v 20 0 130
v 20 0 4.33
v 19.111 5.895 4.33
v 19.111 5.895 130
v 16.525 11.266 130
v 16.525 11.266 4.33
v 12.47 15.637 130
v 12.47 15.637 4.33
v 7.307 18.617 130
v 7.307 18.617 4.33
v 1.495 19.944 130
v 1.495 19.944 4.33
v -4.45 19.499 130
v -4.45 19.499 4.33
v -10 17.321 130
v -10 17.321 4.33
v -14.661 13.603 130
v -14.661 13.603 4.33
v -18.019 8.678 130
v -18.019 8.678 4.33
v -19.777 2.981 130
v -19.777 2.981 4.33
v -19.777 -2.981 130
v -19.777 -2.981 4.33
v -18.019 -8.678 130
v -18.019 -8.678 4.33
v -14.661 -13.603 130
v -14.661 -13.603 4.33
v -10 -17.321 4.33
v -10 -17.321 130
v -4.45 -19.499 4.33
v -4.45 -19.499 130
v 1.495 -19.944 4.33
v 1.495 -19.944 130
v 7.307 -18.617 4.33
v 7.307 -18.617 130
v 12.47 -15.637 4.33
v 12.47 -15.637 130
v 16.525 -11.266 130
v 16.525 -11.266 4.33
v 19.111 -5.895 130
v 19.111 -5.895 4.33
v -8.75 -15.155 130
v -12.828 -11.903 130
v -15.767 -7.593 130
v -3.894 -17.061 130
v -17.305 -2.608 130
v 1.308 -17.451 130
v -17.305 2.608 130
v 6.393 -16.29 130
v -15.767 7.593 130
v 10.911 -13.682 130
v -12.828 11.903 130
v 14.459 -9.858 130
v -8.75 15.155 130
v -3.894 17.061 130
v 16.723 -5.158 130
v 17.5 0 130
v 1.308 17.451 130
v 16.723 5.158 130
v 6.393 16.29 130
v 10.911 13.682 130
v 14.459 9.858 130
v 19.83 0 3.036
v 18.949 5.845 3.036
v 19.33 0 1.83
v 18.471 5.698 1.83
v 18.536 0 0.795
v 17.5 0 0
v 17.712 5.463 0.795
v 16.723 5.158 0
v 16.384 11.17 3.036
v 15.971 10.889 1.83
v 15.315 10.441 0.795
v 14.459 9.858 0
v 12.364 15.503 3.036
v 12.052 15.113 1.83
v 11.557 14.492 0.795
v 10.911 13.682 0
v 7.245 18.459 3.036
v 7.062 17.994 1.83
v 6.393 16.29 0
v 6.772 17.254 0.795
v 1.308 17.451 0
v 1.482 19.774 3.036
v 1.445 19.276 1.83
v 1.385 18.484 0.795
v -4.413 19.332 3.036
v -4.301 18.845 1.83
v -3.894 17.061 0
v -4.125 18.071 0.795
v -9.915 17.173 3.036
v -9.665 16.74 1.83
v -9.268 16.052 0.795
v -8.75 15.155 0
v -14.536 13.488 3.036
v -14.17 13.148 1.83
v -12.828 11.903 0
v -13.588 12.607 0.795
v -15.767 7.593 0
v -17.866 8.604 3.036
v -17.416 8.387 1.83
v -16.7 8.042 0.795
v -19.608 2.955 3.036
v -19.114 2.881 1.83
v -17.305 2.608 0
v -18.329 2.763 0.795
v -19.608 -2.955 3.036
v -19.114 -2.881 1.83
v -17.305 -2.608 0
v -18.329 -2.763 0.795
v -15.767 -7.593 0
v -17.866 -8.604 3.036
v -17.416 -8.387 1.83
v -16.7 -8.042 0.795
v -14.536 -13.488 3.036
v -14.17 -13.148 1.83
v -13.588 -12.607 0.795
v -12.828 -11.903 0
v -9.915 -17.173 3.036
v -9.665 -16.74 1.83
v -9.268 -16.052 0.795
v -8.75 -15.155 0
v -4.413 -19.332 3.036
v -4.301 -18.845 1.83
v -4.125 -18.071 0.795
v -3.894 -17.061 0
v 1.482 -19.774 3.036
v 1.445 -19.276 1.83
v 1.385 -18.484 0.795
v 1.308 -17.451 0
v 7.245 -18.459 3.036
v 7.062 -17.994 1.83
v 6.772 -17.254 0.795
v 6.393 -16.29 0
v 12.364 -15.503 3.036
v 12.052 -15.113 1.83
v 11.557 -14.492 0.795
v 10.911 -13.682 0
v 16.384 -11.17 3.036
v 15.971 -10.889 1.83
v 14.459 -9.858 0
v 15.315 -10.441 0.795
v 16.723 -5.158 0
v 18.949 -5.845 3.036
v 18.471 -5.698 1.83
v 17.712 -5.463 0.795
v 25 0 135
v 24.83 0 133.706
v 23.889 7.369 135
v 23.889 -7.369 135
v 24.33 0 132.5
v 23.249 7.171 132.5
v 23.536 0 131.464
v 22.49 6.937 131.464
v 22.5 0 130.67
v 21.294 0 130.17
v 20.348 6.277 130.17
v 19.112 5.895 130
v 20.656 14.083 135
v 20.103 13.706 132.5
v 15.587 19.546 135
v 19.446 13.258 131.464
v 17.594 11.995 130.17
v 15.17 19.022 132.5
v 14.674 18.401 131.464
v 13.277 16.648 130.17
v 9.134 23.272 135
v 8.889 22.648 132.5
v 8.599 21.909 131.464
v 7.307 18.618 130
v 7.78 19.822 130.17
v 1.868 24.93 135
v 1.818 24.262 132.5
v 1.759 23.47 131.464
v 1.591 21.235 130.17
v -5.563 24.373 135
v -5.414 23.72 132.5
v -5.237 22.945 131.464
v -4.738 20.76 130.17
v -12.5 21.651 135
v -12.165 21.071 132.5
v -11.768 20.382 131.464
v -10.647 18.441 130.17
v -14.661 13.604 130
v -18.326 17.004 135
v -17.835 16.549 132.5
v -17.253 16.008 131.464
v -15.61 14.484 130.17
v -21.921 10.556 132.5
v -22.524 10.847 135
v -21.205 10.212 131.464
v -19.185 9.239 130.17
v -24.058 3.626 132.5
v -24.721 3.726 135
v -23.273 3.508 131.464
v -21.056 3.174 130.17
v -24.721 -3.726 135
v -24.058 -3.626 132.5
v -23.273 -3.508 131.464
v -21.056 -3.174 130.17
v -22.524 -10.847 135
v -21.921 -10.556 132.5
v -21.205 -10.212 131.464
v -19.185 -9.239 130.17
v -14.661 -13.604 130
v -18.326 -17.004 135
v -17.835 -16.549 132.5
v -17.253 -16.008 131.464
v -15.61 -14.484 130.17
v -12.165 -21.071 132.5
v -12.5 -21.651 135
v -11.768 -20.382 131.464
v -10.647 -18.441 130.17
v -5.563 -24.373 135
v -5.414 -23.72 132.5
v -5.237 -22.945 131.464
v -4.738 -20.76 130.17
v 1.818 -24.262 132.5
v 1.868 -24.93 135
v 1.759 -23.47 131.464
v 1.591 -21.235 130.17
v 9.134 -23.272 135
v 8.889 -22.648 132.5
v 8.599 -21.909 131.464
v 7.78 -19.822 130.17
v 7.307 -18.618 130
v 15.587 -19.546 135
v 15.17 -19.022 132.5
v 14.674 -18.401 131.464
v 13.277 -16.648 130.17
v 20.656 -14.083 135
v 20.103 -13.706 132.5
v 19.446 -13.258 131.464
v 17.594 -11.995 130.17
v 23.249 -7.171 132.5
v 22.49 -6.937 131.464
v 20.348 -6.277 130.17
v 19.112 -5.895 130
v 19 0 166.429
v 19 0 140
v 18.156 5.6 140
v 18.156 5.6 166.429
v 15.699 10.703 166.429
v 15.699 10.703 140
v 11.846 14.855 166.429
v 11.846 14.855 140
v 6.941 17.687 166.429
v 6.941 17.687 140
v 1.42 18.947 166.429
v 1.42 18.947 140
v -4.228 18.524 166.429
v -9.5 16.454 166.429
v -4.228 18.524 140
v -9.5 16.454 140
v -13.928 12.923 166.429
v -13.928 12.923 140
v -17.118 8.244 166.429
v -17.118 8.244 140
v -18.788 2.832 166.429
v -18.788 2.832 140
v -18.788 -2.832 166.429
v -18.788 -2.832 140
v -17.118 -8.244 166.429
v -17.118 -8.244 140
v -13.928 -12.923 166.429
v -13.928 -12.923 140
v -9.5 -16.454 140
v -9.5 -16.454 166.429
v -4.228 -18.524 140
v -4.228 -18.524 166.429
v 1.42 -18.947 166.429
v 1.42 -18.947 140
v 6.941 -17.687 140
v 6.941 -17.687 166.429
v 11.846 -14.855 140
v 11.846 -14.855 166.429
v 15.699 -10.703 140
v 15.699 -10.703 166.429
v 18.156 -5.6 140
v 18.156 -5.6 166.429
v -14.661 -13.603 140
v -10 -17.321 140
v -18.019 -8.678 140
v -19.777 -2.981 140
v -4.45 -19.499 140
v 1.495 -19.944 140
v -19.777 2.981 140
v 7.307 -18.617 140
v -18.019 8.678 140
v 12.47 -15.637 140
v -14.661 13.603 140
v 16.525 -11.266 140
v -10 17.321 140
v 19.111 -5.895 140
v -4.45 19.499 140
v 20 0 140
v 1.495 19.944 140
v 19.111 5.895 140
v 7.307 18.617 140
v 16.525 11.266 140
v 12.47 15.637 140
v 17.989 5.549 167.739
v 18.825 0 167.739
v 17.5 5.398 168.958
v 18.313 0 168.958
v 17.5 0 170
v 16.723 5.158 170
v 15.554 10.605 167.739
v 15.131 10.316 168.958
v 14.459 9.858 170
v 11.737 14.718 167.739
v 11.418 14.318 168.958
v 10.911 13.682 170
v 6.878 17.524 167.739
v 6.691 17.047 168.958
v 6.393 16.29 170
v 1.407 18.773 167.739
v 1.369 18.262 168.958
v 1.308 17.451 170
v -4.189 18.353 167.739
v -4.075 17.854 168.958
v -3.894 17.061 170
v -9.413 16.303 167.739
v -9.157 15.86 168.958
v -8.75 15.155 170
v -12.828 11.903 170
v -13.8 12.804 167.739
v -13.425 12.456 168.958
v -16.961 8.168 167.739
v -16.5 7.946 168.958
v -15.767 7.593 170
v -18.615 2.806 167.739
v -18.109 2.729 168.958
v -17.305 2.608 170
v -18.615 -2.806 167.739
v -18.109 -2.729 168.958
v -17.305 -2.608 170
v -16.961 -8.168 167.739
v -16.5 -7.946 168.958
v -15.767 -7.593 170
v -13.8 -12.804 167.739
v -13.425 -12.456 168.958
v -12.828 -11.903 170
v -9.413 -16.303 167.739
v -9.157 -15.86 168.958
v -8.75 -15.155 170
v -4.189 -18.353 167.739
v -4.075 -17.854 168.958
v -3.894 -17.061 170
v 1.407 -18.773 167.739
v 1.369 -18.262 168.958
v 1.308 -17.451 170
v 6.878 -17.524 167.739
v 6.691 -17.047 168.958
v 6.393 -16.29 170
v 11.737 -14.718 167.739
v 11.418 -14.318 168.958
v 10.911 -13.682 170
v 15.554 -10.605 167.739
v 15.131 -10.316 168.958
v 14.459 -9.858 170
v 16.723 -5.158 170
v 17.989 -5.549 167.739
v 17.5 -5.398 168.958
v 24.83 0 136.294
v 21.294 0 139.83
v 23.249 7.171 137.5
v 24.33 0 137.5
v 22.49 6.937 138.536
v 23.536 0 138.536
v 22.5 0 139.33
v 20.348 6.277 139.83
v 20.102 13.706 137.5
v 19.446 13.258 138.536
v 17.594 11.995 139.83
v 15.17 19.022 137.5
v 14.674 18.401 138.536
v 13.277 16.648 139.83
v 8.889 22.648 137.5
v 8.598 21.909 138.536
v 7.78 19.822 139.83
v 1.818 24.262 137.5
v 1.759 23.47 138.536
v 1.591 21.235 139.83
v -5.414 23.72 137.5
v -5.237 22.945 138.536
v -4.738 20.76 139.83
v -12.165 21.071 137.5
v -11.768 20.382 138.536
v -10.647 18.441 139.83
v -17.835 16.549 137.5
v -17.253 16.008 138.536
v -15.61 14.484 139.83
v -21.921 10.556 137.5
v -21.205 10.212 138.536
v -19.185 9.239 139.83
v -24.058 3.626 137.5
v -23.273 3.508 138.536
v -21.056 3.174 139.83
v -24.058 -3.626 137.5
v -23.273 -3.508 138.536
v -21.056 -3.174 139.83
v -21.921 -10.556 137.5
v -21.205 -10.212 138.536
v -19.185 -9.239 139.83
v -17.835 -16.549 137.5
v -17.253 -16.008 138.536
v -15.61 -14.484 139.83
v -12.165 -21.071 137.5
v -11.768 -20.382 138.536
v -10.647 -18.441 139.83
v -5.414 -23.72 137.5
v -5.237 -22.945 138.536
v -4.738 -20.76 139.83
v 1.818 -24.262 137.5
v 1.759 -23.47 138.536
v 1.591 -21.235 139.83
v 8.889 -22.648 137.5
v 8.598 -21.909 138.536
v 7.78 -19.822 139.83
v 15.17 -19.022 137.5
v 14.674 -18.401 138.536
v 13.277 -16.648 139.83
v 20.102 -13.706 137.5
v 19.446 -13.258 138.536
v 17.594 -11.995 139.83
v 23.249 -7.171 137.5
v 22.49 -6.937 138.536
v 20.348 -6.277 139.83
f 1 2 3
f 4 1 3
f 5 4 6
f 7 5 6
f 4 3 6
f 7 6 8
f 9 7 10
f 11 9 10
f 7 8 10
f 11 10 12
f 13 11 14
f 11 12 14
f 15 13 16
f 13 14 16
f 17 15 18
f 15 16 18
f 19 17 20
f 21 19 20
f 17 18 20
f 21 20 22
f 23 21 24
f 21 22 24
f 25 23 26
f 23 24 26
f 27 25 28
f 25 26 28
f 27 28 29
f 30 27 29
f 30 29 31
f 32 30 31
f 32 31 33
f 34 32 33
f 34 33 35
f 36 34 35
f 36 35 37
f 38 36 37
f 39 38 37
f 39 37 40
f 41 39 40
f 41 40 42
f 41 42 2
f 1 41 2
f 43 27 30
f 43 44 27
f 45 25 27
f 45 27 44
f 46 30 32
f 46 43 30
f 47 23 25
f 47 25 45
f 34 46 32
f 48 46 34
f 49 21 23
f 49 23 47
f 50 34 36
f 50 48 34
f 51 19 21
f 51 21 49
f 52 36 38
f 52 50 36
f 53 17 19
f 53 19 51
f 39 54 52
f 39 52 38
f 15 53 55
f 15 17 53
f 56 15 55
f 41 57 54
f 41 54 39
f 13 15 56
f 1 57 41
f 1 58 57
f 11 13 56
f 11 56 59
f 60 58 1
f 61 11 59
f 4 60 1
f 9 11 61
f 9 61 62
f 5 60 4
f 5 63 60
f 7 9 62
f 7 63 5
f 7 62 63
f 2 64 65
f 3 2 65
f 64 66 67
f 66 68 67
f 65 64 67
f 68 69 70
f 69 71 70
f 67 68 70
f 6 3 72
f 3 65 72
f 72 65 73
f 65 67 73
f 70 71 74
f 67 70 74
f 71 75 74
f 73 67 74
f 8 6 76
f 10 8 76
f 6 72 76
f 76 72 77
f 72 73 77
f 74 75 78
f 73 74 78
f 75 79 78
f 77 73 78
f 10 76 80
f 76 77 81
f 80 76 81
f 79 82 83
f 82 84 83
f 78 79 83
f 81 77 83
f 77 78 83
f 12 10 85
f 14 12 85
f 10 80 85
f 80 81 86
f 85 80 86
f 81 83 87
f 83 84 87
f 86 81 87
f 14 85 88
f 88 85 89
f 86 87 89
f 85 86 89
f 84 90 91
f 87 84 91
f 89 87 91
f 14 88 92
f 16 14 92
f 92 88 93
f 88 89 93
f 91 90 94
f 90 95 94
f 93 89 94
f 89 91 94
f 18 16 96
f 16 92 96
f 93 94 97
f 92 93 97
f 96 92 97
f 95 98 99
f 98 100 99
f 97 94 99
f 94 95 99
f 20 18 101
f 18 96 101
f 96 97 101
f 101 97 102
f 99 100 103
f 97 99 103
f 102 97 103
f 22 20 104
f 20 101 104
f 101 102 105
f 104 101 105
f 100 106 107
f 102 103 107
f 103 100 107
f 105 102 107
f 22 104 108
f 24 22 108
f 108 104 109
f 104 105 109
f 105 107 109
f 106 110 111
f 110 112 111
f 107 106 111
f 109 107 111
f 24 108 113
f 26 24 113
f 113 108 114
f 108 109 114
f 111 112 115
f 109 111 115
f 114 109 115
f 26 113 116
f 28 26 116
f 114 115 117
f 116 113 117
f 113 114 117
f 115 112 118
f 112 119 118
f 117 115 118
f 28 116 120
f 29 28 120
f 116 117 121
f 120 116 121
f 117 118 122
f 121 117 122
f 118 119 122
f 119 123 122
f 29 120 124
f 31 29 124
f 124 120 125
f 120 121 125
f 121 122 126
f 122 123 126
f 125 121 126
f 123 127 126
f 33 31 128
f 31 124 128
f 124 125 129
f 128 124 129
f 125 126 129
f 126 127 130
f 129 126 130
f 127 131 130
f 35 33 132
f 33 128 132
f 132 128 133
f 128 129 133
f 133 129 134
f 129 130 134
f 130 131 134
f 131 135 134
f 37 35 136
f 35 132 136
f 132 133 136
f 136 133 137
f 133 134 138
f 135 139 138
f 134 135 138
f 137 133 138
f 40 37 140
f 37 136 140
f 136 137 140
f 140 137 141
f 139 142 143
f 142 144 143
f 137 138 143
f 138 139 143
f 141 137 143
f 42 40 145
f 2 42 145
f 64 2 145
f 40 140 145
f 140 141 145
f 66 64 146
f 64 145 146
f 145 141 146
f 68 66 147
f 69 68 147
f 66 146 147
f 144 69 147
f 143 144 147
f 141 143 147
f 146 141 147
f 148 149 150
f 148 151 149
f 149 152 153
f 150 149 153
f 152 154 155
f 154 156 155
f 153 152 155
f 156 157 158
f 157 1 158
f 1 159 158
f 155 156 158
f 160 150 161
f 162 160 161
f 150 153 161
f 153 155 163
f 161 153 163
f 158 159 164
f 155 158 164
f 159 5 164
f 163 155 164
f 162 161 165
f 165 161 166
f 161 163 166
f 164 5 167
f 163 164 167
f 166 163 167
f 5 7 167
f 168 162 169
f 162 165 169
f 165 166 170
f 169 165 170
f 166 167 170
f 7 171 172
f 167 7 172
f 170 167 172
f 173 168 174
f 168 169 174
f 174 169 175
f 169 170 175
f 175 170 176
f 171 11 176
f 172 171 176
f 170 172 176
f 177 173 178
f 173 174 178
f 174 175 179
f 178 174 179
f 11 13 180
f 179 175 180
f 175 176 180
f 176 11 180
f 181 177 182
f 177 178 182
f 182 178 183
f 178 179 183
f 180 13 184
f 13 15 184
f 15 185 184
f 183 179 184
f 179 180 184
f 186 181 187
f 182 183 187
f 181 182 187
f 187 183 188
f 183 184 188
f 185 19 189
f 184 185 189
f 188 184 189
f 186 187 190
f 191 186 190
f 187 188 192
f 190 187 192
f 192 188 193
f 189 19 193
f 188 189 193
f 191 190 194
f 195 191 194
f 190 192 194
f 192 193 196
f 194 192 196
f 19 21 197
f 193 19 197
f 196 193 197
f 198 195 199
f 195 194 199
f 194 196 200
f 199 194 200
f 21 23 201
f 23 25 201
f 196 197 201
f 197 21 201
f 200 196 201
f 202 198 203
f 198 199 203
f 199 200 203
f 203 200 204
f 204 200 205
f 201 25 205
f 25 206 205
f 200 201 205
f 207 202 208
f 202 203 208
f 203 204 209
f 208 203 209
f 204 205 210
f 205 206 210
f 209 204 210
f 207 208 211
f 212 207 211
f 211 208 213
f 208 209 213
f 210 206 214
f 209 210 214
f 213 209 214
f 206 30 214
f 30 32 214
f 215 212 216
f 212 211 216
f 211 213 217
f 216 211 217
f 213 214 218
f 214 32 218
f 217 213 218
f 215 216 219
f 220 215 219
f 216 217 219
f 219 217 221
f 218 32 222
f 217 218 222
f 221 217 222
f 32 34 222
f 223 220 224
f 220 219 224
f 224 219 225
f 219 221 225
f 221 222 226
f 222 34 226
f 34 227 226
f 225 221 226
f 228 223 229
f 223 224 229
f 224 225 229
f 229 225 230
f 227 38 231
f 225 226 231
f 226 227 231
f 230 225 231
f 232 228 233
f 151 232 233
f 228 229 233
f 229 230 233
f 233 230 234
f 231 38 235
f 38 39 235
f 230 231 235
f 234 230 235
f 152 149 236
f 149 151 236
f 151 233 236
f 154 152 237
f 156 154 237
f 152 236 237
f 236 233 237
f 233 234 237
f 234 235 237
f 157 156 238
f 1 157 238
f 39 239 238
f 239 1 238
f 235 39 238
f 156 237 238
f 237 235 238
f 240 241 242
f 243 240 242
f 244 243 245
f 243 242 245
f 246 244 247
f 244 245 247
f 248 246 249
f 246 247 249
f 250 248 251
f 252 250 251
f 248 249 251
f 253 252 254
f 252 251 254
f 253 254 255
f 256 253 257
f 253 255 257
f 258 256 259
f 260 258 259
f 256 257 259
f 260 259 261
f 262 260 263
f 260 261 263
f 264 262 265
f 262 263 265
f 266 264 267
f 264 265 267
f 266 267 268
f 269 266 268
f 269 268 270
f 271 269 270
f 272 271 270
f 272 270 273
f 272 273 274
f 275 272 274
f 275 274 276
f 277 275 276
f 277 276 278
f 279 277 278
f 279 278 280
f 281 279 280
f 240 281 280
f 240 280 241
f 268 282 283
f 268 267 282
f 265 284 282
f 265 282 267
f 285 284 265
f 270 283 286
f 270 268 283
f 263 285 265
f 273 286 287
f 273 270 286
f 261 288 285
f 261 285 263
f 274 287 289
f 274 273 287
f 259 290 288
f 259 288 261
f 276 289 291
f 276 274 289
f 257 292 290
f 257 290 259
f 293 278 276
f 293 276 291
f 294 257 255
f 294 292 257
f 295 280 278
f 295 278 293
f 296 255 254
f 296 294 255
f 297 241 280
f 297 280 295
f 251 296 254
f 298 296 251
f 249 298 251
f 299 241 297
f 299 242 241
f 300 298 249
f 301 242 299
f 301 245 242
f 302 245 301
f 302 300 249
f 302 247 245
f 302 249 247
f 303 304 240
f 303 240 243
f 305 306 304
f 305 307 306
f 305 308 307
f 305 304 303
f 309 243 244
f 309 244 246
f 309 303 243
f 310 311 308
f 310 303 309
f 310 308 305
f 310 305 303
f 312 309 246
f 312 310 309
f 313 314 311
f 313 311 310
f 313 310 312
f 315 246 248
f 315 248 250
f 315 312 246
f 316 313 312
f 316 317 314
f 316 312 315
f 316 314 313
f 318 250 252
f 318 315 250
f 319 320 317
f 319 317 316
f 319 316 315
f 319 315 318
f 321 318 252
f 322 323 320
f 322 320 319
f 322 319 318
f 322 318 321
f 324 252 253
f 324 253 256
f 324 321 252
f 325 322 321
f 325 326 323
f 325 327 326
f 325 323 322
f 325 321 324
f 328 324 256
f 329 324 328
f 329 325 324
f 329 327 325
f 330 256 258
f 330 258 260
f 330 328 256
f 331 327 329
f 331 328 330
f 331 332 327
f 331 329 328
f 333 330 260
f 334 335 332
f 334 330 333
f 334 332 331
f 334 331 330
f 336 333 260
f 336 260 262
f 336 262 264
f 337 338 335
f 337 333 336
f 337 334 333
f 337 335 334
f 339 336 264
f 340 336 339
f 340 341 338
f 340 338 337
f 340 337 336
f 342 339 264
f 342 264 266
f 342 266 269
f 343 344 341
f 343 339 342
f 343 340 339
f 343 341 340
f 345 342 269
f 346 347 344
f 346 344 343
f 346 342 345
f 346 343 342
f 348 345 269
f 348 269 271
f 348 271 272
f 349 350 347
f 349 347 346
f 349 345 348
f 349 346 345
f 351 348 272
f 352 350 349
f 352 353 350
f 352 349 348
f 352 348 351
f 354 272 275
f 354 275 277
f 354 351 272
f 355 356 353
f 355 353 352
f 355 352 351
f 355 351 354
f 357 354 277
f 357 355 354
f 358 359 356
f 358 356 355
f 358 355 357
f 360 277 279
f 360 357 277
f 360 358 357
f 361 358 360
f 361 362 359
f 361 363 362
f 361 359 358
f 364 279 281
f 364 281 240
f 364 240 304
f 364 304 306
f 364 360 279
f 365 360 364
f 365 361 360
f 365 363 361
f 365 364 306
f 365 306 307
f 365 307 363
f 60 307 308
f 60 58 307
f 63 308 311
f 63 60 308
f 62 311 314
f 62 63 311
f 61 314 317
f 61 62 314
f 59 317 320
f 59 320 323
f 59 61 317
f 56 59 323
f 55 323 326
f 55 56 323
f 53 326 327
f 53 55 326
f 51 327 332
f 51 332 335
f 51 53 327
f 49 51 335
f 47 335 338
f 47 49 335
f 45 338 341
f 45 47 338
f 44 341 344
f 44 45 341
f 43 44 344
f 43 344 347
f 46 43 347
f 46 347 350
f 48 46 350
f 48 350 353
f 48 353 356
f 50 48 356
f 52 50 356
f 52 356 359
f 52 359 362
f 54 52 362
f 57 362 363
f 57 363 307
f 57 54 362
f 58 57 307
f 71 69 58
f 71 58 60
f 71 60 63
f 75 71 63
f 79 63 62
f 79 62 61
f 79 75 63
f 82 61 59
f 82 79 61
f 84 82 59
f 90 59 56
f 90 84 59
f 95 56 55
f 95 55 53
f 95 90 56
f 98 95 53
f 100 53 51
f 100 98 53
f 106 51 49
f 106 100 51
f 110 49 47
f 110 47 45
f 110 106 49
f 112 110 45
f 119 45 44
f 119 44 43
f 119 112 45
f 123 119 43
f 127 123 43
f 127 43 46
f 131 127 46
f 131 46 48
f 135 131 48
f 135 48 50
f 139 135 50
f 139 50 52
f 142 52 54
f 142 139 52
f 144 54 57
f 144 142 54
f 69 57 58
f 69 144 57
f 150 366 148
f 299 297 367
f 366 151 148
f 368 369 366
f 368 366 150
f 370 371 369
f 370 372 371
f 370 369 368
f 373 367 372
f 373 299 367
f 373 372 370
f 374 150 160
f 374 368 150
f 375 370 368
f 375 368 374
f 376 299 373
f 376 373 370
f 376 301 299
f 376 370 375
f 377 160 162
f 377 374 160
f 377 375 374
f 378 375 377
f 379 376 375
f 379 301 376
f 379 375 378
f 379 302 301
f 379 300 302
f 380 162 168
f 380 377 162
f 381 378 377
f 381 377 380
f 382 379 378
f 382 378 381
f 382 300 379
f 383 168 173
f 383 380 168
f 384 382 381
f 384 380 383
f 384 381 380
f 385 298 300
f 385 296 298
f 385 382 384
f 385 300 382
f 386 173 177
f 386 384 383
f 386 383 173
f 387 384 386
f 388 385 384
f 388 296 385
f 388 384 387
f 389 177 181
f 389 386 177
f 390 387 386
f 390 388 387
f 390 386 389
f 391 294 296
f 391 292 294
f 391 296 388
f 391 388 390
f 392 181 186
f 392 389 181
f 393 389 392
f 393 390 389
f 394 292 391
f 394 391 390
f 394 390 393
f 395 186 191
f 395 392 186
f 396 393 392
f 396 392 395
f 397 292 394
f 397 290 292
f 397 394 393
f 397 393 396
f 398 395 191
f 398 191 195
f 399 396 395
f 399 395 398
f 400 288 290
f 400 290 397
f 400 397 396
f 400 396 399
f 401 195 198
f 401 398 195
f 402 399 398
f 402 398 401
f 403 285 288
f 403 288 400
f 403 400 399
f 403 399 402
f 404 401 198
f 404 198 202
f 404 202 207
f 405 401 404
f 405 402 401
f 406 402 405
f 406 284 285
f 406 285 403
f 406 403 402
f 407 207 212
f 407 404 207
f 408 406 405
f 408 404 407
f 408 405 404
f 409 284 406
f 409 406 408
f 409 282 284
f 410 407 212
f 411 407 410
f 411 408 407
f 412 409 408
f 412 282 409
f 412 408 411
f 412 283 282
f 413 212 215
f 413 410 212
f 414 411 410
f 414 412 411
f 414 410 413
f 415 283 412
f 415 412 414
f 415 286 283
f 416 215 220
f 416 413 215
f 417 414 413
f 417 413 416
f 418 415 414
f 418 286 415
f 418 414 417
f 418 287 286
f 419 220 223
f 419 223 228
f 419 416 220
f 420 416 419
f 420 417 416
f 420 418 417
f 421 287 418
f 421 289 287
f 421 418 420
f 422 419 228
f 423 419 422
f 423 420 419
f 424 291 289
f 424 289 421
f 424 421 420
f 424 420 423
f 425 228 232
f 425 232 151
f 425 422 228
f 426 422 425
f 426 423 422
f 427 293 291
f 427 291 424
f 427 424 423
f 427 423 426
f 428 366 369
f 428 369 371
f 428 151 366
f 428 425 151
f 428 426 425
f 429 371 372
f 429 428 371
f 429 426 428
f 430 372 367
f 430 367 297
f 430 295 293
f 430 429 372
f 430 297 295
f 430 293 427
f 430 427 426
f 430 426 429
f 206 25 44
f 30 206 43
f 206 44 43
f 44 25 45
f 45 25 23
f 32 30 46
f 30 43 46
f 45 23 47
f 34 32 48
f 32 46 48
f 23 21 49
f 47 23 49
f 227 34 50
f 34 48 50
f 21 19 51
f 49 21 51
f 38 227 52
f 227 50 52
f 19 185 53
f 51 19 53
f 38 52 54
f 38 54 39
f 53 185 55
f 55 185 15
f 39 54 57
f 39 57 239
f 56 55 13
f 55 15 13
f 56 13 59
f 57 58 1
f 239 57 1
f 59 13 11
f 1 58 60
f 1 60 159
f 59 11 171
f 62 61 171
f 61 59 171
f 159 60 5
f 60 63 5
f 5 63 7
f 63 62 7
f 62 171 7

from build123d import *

# Parameters (mm, degrees)
F0_R      = 20
F0_R_2    = 17.5
F1_DEPTH  = 130
F2_R      = 25
F2_R_2    = 20
F2_R_3    = 17.5
F3_DEPTH  = 10
F4_R      = 19
F4_R_2    = 17.5
F5_DEPTH  = 30
F6_2_F1_R = 5
F6_2_F2_R = 4.9999


# Not quite as in the source:
# - a fillet or chamfer that OpenCascade refuses, or shapes differently, is made with other operations: its cross-section is extruded or revolved along the edge and cut away or added
# - a fillet or chamfer is up to 0.001 mm smaller than in the source, because OpenCascade refuses the exact size
# - a feature names something its author has since deleted; it is built from what else it names


with BuildPart() as f1:
    # F0 (on Top) → F1 (new body)
    with BuildSketch(Plane.XY):
        Circle(F0_R)
        Circle(F0_R_2, mode=Mode.SUBTRACT)
    extrude(amount=F1_DEPTH)

    # F6: fillet of radius 5 on 1 edges, made by hand

    # F6_s1 → F6_t2 (revolve, cut)
    with BuildSketch(Plane.XZ):
        with BuildLine():
            ThreePointArc((20, 4.3301270189), (19.3301270189, 1.8301270189), (17.5, 0))
            Line((17.5, 0), (20, 0))
            Line((20, 0), (20, 4.3301270189))
        make_face()
    revolve(axis=Axis((0, 0, 0), (0, 0, 1)), mode=Mode.SUBTRACT)


with BuildPart() as f3:
    # F2 (on face) → F3 (new body)
    with BuildSketch(Plane.XY.offset(130)):
        Circle(F2_R)
        Circle(F2_R_2, mode=Mode.SUBTRACT)
        Circle(F2_R_2)
        Circle(F2_R_3, mode=Mode.SUBTRACT)
    extrude(amount=F3_DEPTH)

    # F4 (on face) → F5 (join)
    with BuildSketch(Plane.XY.offset(140)):
        Circle(F4_R)
        Circle(F4_R_2, mode=Mode.SUBTRACT)
    extrude(amount=F5_DEPTH)

    # F6#2: fillet of radius 5 on 2 edges, made by hand

    # F6_2_f1
    f6_2_f1_edges = [f3.edges().sort_by_distance(p)[0] for p in [
        (-25, 0, 140),
    ]]
    fillet(f6_2_f1_edges, radius=F6_2_F1_R)

    # F6_2_f2 (radius 5 in the source; OpenCascade refuses exactly that, so slightly less here)
    f6_2_f2_edges = [f3.edges().sort_by_distance(p)[0] for p in [
        (-25, 0, 130),
    ]]
    fillet(f6_2_f2_edges, radius=F6_2_F2_R)

    # F7: fillet of radius 5 on 1 edges, made by hand

    # F7_s1 → F7_t2 (revolve, cut)
    with BuildSketch(Plane.XZ):
        with BuildLine():
            ThreePointArc((19, 166.4292857857), (18.6097722286, 168.3657774588), (17.5, 170))
            Line((17.5, 170), (19, 170))
            Line((19, 170), (19, 166.4292857857))
        make_face()
    revolve(axis=Axis((0, 0, 170), (0, 0, 1)), mode=Mode.SUBTRACT)


solid = Compound([f1.part, f3.part])
